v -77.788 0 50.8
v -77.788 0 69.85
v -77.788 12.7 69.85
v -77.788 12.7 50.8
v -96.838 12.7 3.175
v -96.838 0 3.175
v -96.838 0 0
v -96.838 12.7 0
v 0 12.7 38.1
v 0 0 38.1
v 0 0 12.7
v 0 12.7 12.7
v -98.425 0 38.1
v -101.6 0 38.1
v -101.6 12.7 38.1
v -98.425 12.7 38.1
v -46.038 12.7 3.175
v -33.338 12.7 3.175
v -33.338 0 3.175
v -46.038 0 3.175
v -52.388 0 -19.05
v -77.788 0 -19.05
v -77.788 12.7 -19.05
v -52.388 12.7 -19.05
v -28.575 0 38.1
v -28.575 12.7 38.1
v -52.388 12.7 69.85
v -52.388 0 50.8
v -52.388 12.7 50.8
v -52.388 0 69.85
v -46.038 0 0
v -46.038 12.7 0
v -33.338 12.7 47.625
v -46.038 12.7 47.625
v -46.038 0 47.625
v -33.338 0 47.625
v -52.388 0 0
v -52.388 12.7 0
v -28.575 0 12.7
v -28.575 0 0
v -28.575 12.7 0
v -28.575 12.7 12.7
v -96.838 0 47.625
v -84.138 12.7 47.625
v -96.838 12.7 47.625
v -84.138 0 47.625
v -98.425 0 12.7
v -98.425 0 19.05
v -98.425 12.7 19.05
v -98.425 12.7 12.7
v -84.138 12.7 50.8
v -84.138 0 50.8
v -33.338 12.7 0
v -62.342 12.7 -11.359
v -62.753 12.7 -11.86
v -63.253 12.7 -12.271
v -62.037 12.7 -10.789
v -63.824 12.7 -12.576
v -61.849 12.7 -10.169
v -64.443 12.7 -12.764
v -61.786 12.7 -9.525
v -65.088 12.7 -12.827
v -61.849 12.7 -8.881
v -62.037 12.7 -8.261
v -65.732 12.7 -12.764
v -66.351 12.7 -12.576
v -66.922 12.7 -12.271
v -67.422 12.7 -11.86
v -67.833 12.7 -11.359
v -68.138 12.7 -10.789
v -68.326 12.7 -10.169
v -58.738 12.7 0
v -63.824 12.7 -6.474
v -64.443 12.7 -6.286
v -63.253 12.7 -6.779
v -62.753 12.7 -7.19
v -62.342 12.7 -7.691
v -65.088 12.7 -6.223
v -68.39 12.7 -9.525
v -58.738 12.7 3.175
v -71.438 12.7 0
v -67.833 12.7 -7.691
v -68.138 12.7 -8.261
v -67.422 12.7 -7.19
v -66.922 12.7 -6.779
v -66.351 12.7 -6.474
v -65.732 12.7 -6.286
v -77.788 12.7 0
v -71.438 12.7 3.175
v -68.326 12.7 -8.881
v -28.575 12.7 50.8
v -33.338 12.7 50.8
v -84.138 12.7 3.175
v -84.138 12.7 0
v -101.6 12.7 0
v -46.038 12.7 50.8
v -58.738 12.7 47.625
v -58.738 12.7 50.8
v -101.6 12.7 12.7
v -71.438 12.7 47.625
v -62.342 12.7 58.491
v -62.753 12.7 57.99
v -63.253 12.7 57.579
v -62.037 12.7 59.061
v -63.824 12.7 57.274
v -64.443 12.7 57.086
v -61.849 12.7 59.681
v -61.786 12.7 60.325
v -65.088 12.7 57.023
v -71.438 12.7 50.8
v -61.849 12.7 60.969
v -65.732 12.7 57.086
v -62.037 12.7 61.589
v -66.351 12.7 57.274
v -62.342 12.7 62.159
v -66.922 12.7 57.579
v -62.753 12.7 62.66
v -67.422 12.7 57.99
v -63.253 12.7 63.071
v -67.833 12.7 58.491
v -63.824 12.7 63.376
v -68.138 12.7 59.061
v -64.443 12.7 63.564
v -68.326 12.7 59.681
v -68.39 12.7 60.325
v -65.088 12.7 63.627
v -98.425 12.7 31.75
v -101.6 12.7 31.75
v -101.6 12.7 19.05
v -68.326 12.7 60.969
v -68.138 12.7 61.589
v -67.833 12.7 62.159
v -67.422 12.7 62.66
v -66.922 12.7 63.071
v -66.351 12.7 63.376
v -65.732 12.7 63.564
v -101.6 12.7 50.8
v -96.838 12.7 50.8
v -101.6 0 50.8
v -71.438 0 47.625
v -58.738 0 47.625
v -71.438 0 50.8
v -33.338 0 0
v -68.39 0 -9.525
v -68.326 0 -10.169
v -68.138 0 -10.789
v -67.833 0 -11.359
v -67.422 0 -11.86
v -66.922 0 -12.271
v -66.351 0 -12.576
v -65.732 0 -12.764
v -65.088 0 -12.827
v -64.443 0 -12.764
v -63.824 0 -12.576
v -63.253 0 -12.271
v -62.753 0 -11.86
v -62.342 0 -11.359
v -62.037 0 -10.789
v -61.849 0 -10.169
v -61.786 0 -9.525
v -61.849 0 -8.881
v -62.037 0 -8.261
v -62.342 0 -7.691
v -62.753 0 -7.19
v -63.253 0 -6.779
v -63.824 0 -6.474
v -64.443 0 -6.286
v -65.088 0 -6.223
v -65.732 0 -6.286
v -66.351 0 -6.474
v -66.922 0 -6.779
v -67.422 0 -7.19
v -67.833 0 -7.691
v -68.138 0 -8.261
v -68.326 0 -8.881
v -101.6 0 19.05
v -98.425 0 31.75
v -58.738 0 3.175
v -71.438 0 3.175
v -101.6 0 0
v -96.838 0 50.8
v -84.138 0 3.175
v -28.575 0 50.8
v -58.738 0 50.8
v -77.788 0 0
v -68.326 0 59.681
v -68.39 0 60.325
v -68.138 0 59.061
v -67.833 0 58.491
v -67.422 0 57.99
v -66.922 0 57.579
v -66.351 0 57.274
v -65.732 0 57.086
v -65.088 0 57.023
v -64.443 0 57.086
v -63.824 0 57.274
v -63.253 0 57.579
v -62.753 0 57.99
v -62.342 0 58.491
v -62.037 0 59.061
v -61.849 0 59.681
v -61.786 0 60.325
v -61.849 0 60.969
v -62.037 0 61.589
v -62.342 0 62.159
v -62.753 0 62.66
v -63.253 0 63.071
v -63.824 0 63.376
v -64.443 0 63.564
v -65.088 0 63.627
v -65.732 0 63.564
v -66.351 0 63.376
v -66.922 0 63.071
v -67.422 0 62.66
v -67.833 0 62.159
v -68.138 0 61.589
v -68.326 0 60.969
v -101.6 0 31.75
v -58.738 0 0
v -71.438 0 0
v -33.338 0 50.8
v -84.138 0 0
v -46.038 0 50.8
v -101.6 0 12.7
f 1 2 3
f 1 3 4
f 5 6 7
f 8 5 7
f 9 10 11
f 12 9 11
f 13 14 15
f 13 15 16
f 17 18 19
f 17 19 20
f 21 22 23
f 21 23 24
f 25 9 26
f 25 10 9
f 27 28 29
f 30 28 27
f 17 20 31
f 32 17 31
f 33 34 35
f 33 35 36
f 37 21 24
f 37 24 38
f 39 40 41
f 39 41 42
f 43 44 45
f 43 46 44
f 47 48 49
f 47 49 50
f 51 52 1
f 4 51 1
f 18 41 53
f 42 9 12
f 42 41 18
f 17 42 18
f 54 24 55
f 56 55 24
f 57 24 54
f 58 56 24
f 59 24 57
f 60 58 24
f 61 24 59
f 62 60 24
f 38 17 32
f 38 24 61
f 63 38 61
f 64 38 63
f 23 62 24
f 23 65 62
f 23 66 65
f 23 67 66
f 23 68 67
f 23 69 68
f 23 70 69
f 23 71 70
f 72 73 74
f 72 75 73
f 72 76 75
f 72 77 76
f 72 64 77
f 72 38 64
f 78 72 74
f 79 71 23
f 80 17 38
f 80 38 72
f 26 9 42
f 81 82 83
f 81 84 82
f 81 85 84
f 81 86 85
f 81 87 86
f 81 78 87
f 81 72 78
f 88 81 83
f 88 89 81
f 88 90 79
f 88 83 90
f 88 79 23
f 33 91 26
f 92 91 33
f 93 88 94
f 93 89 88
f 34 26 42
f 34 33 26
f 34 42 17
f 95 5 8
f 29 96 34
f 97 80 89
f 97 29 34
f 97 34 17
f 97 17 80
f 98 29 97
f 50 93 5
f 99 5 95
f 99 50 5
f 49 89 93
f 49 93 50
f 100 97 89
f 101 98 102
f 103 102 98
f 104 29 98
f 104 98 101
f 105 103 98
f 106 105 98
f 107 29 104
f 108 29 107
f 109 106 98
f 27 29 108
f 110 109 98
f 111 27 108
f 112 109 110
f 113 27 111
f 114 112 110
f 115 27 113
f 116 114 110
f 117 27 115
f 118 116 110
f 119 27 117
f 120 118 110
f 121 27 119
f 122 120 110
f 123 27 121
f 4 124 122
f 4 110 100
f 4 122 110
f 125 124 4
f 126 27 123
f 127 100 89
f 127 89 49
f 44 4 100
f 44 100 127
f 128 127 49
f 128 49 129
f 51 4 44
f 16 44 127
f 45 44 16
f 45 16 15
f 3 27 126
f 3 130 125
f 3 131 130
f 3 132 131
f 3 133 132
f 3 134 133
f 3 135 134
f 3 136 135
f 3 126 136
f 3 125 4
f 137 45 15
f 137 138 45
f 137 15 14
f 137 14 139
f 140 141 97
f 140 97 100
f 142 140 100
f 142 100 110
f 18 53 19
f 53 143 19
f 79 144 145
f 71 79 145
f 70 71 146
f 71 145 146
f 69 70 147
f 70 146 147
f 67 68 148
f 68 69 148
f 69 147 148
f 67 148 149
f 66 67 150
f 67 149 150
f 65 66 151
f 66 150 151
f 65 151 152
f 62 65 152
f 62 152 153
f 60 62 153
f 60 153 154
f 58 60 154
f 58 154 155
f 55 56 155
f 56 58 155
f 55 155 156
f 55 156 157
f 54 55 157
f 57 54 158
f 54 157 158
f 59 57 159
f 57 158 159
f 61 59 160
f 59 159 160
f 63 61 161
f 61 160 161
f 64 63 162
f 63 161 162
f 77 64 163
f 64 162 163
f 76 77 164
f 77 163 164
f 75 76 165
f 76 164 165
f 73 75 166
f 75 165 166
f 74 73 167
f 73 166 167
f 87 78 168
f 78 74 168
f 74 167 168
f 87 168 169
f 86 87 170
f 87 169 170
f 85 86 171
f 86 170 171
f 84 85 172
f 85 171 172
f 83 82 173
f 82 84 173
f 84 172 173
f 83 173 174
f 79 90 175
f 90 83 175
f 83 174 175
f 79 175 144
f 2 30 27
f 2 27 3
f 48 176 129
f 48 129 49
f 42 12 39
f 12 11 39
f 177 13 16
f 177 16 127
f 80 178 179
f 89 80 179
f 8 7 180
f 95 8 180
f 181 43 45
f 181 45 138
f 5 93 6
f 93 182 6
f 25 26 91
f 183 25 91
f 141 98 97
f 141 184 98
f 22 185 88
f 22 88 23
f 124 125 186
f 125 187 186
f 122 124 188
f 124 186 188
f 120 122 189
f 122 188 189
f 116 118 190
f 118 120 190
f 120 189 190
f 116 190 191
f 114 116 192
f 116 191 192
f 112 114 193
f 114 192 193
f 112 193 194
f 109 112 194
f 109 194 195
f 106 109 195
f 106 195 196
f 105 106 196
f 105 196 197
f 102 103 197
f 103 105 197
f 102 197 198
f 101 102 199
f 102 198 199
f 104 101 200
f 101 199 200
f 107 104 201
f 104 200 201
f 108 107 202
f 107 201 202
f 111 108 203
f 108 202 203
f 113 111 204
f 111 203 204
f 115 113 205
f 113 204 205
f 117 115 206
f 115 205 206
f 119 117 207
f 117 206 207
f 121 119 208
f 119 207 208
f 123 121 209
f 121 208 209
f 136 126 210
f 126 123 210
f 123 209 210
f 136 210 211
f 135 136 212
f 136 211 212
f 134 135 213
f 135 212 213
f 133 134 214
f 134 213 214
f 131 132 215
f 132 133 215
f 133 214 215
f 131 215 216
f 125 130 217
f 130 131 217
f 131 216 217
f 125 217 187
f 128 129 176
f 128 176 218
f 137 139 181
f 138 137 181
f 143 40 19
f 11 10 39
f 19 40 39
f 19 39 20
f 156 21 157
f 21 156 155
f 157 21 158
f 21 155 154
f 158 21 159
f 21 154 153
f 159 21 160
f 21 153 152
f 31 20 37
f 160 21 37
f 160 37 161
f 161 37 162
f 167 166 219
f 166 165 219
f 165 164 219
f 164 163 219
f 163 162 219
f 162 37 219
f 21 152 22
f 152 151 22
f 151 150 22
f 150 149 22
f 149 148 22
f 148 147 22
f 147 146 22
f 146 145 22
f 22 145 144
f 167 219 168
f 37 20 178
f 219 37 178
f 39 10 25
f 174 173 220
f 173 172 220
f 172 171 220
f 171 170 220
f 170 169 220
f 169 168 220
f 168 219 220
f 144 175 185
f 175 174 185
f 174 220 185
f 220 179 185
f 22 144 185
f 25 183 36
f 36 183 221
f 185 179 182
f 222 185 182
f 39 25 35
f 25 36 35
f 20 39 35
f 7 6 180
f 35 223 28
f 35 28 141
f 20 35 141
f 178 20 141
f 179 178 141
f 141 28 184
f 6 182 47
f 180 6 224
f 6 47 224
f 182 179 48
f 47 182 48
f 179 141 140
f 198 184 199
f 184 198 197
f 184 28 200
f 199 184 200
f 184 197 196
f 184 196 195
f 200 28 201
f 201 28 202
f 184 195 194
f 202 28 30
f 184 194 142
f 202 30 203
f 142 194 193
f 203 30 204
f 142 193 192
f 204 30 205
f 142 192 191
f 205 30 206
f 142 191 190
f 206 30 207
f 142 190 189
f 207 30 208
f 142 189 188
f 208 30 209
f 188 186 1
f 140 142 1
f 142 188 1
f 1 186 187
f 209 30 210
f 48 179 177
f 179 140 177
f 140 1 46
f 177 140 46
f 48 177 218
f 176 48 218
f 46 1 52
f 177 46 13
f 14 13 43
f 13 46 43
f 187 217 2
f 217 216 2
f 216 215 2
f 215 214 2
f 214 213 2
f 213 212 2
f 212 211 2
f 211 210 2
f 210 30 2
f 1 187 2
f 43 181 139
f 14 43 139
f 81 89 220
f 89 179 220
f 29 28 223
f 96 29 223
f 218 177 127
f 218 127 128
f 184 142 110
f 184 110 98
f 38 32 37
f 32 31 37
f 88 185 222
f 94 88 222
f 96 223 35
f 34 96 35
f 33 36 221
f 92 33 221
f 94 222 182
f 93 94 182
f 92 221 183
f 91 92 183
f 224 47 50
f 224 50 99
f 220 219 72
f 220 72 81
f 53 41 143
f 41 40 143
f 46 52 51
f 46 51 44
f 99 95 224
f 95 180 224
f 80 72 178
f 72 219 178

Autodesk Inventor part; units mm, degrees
ref_plane "YZ Plane" through (0, 0, 0) normal (1, 0, 0) x (0, 1, 0)
ref_plane "XZ Plane" through (0, 0, 0) normal (0, 1, 0) x (-1, 0, 0)
ref_plane "XY Plane" through (0, 0, 0) normal (0, 0, 1) x (1, 0, 0)
sketch "Sketch1" plane through (0, 0, 0) normal (0, 1, 0) x (-1, 0, 0)
  line L0 (0, 0) -> (101.6, 0)
  line L1 (101.6, 0) -> (101.6, 50.8)
  line L2 (101.6, 50.8) -> (0, 50.8)
  line L3 (0, 50.8) -> (0, 0)
  line L4 (101.6, 0) -> (28.575, 0)
  line L5 (28.575, 0) -> (28.575, 50.8)
  line L6 (28.575, 50.8) -> (101.6, 50.8)
  line L7 (101.6, 50.8) -> (101.6, 0)
  line L8 (28.575, 0) -> (0, 0)
  line L9 (0, 0) -> (0, 12.7)
  line L10 (0, 12.7) -> (28.575, 12.7)
  line L11 (28.575, 12.7) -> (28.575, 0)
  line L12 (28.575, 50.8) -> (0, 50.8)
  line L13 (0, 50.8) -> (0, 38.1)
  line L14 (0, 38.1) -> (28.575, 38.1)
  line L15 (28.575, 38.1) -> (28.575, 50.8)
  line L16 (96.8375, 0) -> (84.1375, 0)
  line L17 (84.1375, 0) -> (84.1375, 3.175)
  line L18 (84.1375, 3.175) -> (96.8375, 3.175)
  line L19 (96.8375, 3.175) -> (96.8375, 0)
  line L20 (71.4375, 0) -> (58.7375, 0)
  line L21 (58.7375, 0) -> (58.7375, 3.175)
  line L22 (58.7375, 3.175) -> (71.4375, 3.175)
  line L23 (71.4375, 3.175) -> (71.4375, 0)
  line L24 (46.0375, 0) -> (33.3375, 0)
  line L25 (33.3375, 0) -> (33.3375, 3.175)
  line L26 (33.3375, 3.175) -> (46.0375, 3.175)
  line L27 (46.0375, 3.175) -> (46.0375, 0)
  line L28 (96.8375, 50.8) -> (84.1375, 50.8)
  line L29 (84.1375, 50.8) -> (84.1375, 47.625)
  line L30 (84.1375, 47.625) -> (96.8375, 47.625)
  line L31 (96.8375, 47.625) -> (96.8375, 50.8)
  line L32 (71.4375, 50.8) -> (58.7375, 50.8)
  line L33 (58.7375, 50.8) -> (58.7375, 47.625)
  line L34 (58.7375, 47.625) -> (71.4375, 47.625)
  line L35 (71.4375, 47.625) -> (71.4375, 50.8)
  line L36 (101.6, 38.1) -> (98.425, 38.1)
  line L37 (98.425, 38.1) -> (98.425, 31.75)
  line L38 (98.425, 31.75) -> (101.6, 31.75)
  line L39 (101.6, 31.75) -> (101.6, 38.1)
  line L40 (101.6, 19.05) -> (98.425, 19.05)
  line L41 (98.425, 19.05) -> (98.425, 12.7)
  line L42 (98.425, 12.7) -> (101.6, 12.7)
  line L43 (101.6, 12.7) -> (101.6, 19.05)
  line L44 (46.0375, 50.8) -> (46.0375, 47.625)
  line L45 (46.0375, 47.625) -> (33.3375, 47.625)
  line L46 (33.3375, 47.625) -> (33.3375, 50.8)
  line L47 (33.3375, 50.8) -> (46.0375, 50.8)
  line L48 (52.3875, 0) -> (77.7875, 0)
  line L49 (77.7875, 0) -> (77.7875, -19.05)
  line L50 (77.7875, -19.05) -> (52.3875, -19.05)
  line L51 (52.3875, -19.05) -> (52.3875, 0)
  line L52 (52.3875, 50.8) -> (52.3875, 69.85)
  line L53 (52.3875, 69.85) -> (77.7875, 69.85)
  line L54 (77.7875, 69.85) -> (77.7875, 50.8)
  line L55 (77.7875, 50.8) -> (52.3875, 50.8)
  circle A0 centre (65.0875, -9.525) radius 3.302
  circle A1 centre (65.0875, 60.325) radius 3.302
  point P0 (96.8375, 0)
  point P1 (96.8375, 50.8)
  point P2 (84.1375, 50.8)
  point P3 (71.4375, 50.8)
  point P4 (58.7375, 50.8)
  point P5 (46.0375, 50.8)
  point P6 (33.3375, 50.8)
  point P7 (33.3375, 0)
  point P8 (46.0375, 0)
  point P9 (58.7375, 0)
  point P10 (71.4375, 0)
  point P11 (84.1375, 0)
  dimension "d56" = 101.6
  dimension "d57" = 50.8
  dimension "d58" = 73.025
  dimension "d59" = 50.8
  dimension "d60" = 12.7
  dimension "d61" = 12.7
  dimension "d62" = 12.7
  dimension "d63" = 3.175
  dimension "d64" = 12.7
  dimension "d65" = 3.175
  dimension "d66" = 12.7
  dimension "d67" = 4.7625
  dimension "d68" = 12.7
  dimension "d69" = 3.175
  dimension "d70" = 12.7
  dimension "d71" = 12.7
  dimension "d72" = 3.175
  dimension "d73" = 12.7
  dimension "d74" = 3.175
  dimension "d77" = 4.7625
  dimension "d78" = 12.7
  dimension "d79" = 3.175
  dimension "d80" = 6.35
  dimension "d81" = 12.7
  dimension "d82" = 3.175
  dimension "d83" = 6.35
  dimension "d84" = 12.7
  dimension "d86" = 44.45
  dimension "d89" = 3.175
  dimension "d90" = 12.7
  dimension "d91" = 12.7
  dimension "d94" = 25.4
  dimension "d96" = 23.8125
  dimension "d97" = 23.8125
  dimension "d99" = 25.4
  dimension "d116" = 6.604
  dimension "d117" = 9.525
  dimension "d118" = 6.604
  dimension "d119" = 9.525
  dimension "d122" = 9.525
  dimension "d123" = 9.525
extrude "Extrusion4" add sketch "Sketch1" along normal blind 12.7 contours L5 L2 L46 L45 L44 L33 L34 L35 L29 L30 L31 L1 L36 L37 L38 L40 L41 L42 L0 L19 L18 L17 L23 L22 L21 L27 L26 L25 | L3 L14 L5 L10 | L0 L49 L50 L51 | L52 L53 L54 L2
equation "\"d124\" = d78"
equation "\"BendRadius\" = Thickness"
equation "\"BendReliefWidth\" = Thickness"
equation "\"BendReliefDepth\" = 0.5 * Thickness"
equation "\"CornerReliefSize\" = 4 * Thickness"
equation "\"MinimumRemnant\" = 2 * Thickness"
equation "\"TransitionRadius\" = BendRadius"
equation "\"JacobiRadiusSize\" = BendRadius"
equation "\"GapSize\" = Thickness"
equation "\"Thickness\" = 3.048"
properties part number "Burrow_Base_Detachable_EXT"
